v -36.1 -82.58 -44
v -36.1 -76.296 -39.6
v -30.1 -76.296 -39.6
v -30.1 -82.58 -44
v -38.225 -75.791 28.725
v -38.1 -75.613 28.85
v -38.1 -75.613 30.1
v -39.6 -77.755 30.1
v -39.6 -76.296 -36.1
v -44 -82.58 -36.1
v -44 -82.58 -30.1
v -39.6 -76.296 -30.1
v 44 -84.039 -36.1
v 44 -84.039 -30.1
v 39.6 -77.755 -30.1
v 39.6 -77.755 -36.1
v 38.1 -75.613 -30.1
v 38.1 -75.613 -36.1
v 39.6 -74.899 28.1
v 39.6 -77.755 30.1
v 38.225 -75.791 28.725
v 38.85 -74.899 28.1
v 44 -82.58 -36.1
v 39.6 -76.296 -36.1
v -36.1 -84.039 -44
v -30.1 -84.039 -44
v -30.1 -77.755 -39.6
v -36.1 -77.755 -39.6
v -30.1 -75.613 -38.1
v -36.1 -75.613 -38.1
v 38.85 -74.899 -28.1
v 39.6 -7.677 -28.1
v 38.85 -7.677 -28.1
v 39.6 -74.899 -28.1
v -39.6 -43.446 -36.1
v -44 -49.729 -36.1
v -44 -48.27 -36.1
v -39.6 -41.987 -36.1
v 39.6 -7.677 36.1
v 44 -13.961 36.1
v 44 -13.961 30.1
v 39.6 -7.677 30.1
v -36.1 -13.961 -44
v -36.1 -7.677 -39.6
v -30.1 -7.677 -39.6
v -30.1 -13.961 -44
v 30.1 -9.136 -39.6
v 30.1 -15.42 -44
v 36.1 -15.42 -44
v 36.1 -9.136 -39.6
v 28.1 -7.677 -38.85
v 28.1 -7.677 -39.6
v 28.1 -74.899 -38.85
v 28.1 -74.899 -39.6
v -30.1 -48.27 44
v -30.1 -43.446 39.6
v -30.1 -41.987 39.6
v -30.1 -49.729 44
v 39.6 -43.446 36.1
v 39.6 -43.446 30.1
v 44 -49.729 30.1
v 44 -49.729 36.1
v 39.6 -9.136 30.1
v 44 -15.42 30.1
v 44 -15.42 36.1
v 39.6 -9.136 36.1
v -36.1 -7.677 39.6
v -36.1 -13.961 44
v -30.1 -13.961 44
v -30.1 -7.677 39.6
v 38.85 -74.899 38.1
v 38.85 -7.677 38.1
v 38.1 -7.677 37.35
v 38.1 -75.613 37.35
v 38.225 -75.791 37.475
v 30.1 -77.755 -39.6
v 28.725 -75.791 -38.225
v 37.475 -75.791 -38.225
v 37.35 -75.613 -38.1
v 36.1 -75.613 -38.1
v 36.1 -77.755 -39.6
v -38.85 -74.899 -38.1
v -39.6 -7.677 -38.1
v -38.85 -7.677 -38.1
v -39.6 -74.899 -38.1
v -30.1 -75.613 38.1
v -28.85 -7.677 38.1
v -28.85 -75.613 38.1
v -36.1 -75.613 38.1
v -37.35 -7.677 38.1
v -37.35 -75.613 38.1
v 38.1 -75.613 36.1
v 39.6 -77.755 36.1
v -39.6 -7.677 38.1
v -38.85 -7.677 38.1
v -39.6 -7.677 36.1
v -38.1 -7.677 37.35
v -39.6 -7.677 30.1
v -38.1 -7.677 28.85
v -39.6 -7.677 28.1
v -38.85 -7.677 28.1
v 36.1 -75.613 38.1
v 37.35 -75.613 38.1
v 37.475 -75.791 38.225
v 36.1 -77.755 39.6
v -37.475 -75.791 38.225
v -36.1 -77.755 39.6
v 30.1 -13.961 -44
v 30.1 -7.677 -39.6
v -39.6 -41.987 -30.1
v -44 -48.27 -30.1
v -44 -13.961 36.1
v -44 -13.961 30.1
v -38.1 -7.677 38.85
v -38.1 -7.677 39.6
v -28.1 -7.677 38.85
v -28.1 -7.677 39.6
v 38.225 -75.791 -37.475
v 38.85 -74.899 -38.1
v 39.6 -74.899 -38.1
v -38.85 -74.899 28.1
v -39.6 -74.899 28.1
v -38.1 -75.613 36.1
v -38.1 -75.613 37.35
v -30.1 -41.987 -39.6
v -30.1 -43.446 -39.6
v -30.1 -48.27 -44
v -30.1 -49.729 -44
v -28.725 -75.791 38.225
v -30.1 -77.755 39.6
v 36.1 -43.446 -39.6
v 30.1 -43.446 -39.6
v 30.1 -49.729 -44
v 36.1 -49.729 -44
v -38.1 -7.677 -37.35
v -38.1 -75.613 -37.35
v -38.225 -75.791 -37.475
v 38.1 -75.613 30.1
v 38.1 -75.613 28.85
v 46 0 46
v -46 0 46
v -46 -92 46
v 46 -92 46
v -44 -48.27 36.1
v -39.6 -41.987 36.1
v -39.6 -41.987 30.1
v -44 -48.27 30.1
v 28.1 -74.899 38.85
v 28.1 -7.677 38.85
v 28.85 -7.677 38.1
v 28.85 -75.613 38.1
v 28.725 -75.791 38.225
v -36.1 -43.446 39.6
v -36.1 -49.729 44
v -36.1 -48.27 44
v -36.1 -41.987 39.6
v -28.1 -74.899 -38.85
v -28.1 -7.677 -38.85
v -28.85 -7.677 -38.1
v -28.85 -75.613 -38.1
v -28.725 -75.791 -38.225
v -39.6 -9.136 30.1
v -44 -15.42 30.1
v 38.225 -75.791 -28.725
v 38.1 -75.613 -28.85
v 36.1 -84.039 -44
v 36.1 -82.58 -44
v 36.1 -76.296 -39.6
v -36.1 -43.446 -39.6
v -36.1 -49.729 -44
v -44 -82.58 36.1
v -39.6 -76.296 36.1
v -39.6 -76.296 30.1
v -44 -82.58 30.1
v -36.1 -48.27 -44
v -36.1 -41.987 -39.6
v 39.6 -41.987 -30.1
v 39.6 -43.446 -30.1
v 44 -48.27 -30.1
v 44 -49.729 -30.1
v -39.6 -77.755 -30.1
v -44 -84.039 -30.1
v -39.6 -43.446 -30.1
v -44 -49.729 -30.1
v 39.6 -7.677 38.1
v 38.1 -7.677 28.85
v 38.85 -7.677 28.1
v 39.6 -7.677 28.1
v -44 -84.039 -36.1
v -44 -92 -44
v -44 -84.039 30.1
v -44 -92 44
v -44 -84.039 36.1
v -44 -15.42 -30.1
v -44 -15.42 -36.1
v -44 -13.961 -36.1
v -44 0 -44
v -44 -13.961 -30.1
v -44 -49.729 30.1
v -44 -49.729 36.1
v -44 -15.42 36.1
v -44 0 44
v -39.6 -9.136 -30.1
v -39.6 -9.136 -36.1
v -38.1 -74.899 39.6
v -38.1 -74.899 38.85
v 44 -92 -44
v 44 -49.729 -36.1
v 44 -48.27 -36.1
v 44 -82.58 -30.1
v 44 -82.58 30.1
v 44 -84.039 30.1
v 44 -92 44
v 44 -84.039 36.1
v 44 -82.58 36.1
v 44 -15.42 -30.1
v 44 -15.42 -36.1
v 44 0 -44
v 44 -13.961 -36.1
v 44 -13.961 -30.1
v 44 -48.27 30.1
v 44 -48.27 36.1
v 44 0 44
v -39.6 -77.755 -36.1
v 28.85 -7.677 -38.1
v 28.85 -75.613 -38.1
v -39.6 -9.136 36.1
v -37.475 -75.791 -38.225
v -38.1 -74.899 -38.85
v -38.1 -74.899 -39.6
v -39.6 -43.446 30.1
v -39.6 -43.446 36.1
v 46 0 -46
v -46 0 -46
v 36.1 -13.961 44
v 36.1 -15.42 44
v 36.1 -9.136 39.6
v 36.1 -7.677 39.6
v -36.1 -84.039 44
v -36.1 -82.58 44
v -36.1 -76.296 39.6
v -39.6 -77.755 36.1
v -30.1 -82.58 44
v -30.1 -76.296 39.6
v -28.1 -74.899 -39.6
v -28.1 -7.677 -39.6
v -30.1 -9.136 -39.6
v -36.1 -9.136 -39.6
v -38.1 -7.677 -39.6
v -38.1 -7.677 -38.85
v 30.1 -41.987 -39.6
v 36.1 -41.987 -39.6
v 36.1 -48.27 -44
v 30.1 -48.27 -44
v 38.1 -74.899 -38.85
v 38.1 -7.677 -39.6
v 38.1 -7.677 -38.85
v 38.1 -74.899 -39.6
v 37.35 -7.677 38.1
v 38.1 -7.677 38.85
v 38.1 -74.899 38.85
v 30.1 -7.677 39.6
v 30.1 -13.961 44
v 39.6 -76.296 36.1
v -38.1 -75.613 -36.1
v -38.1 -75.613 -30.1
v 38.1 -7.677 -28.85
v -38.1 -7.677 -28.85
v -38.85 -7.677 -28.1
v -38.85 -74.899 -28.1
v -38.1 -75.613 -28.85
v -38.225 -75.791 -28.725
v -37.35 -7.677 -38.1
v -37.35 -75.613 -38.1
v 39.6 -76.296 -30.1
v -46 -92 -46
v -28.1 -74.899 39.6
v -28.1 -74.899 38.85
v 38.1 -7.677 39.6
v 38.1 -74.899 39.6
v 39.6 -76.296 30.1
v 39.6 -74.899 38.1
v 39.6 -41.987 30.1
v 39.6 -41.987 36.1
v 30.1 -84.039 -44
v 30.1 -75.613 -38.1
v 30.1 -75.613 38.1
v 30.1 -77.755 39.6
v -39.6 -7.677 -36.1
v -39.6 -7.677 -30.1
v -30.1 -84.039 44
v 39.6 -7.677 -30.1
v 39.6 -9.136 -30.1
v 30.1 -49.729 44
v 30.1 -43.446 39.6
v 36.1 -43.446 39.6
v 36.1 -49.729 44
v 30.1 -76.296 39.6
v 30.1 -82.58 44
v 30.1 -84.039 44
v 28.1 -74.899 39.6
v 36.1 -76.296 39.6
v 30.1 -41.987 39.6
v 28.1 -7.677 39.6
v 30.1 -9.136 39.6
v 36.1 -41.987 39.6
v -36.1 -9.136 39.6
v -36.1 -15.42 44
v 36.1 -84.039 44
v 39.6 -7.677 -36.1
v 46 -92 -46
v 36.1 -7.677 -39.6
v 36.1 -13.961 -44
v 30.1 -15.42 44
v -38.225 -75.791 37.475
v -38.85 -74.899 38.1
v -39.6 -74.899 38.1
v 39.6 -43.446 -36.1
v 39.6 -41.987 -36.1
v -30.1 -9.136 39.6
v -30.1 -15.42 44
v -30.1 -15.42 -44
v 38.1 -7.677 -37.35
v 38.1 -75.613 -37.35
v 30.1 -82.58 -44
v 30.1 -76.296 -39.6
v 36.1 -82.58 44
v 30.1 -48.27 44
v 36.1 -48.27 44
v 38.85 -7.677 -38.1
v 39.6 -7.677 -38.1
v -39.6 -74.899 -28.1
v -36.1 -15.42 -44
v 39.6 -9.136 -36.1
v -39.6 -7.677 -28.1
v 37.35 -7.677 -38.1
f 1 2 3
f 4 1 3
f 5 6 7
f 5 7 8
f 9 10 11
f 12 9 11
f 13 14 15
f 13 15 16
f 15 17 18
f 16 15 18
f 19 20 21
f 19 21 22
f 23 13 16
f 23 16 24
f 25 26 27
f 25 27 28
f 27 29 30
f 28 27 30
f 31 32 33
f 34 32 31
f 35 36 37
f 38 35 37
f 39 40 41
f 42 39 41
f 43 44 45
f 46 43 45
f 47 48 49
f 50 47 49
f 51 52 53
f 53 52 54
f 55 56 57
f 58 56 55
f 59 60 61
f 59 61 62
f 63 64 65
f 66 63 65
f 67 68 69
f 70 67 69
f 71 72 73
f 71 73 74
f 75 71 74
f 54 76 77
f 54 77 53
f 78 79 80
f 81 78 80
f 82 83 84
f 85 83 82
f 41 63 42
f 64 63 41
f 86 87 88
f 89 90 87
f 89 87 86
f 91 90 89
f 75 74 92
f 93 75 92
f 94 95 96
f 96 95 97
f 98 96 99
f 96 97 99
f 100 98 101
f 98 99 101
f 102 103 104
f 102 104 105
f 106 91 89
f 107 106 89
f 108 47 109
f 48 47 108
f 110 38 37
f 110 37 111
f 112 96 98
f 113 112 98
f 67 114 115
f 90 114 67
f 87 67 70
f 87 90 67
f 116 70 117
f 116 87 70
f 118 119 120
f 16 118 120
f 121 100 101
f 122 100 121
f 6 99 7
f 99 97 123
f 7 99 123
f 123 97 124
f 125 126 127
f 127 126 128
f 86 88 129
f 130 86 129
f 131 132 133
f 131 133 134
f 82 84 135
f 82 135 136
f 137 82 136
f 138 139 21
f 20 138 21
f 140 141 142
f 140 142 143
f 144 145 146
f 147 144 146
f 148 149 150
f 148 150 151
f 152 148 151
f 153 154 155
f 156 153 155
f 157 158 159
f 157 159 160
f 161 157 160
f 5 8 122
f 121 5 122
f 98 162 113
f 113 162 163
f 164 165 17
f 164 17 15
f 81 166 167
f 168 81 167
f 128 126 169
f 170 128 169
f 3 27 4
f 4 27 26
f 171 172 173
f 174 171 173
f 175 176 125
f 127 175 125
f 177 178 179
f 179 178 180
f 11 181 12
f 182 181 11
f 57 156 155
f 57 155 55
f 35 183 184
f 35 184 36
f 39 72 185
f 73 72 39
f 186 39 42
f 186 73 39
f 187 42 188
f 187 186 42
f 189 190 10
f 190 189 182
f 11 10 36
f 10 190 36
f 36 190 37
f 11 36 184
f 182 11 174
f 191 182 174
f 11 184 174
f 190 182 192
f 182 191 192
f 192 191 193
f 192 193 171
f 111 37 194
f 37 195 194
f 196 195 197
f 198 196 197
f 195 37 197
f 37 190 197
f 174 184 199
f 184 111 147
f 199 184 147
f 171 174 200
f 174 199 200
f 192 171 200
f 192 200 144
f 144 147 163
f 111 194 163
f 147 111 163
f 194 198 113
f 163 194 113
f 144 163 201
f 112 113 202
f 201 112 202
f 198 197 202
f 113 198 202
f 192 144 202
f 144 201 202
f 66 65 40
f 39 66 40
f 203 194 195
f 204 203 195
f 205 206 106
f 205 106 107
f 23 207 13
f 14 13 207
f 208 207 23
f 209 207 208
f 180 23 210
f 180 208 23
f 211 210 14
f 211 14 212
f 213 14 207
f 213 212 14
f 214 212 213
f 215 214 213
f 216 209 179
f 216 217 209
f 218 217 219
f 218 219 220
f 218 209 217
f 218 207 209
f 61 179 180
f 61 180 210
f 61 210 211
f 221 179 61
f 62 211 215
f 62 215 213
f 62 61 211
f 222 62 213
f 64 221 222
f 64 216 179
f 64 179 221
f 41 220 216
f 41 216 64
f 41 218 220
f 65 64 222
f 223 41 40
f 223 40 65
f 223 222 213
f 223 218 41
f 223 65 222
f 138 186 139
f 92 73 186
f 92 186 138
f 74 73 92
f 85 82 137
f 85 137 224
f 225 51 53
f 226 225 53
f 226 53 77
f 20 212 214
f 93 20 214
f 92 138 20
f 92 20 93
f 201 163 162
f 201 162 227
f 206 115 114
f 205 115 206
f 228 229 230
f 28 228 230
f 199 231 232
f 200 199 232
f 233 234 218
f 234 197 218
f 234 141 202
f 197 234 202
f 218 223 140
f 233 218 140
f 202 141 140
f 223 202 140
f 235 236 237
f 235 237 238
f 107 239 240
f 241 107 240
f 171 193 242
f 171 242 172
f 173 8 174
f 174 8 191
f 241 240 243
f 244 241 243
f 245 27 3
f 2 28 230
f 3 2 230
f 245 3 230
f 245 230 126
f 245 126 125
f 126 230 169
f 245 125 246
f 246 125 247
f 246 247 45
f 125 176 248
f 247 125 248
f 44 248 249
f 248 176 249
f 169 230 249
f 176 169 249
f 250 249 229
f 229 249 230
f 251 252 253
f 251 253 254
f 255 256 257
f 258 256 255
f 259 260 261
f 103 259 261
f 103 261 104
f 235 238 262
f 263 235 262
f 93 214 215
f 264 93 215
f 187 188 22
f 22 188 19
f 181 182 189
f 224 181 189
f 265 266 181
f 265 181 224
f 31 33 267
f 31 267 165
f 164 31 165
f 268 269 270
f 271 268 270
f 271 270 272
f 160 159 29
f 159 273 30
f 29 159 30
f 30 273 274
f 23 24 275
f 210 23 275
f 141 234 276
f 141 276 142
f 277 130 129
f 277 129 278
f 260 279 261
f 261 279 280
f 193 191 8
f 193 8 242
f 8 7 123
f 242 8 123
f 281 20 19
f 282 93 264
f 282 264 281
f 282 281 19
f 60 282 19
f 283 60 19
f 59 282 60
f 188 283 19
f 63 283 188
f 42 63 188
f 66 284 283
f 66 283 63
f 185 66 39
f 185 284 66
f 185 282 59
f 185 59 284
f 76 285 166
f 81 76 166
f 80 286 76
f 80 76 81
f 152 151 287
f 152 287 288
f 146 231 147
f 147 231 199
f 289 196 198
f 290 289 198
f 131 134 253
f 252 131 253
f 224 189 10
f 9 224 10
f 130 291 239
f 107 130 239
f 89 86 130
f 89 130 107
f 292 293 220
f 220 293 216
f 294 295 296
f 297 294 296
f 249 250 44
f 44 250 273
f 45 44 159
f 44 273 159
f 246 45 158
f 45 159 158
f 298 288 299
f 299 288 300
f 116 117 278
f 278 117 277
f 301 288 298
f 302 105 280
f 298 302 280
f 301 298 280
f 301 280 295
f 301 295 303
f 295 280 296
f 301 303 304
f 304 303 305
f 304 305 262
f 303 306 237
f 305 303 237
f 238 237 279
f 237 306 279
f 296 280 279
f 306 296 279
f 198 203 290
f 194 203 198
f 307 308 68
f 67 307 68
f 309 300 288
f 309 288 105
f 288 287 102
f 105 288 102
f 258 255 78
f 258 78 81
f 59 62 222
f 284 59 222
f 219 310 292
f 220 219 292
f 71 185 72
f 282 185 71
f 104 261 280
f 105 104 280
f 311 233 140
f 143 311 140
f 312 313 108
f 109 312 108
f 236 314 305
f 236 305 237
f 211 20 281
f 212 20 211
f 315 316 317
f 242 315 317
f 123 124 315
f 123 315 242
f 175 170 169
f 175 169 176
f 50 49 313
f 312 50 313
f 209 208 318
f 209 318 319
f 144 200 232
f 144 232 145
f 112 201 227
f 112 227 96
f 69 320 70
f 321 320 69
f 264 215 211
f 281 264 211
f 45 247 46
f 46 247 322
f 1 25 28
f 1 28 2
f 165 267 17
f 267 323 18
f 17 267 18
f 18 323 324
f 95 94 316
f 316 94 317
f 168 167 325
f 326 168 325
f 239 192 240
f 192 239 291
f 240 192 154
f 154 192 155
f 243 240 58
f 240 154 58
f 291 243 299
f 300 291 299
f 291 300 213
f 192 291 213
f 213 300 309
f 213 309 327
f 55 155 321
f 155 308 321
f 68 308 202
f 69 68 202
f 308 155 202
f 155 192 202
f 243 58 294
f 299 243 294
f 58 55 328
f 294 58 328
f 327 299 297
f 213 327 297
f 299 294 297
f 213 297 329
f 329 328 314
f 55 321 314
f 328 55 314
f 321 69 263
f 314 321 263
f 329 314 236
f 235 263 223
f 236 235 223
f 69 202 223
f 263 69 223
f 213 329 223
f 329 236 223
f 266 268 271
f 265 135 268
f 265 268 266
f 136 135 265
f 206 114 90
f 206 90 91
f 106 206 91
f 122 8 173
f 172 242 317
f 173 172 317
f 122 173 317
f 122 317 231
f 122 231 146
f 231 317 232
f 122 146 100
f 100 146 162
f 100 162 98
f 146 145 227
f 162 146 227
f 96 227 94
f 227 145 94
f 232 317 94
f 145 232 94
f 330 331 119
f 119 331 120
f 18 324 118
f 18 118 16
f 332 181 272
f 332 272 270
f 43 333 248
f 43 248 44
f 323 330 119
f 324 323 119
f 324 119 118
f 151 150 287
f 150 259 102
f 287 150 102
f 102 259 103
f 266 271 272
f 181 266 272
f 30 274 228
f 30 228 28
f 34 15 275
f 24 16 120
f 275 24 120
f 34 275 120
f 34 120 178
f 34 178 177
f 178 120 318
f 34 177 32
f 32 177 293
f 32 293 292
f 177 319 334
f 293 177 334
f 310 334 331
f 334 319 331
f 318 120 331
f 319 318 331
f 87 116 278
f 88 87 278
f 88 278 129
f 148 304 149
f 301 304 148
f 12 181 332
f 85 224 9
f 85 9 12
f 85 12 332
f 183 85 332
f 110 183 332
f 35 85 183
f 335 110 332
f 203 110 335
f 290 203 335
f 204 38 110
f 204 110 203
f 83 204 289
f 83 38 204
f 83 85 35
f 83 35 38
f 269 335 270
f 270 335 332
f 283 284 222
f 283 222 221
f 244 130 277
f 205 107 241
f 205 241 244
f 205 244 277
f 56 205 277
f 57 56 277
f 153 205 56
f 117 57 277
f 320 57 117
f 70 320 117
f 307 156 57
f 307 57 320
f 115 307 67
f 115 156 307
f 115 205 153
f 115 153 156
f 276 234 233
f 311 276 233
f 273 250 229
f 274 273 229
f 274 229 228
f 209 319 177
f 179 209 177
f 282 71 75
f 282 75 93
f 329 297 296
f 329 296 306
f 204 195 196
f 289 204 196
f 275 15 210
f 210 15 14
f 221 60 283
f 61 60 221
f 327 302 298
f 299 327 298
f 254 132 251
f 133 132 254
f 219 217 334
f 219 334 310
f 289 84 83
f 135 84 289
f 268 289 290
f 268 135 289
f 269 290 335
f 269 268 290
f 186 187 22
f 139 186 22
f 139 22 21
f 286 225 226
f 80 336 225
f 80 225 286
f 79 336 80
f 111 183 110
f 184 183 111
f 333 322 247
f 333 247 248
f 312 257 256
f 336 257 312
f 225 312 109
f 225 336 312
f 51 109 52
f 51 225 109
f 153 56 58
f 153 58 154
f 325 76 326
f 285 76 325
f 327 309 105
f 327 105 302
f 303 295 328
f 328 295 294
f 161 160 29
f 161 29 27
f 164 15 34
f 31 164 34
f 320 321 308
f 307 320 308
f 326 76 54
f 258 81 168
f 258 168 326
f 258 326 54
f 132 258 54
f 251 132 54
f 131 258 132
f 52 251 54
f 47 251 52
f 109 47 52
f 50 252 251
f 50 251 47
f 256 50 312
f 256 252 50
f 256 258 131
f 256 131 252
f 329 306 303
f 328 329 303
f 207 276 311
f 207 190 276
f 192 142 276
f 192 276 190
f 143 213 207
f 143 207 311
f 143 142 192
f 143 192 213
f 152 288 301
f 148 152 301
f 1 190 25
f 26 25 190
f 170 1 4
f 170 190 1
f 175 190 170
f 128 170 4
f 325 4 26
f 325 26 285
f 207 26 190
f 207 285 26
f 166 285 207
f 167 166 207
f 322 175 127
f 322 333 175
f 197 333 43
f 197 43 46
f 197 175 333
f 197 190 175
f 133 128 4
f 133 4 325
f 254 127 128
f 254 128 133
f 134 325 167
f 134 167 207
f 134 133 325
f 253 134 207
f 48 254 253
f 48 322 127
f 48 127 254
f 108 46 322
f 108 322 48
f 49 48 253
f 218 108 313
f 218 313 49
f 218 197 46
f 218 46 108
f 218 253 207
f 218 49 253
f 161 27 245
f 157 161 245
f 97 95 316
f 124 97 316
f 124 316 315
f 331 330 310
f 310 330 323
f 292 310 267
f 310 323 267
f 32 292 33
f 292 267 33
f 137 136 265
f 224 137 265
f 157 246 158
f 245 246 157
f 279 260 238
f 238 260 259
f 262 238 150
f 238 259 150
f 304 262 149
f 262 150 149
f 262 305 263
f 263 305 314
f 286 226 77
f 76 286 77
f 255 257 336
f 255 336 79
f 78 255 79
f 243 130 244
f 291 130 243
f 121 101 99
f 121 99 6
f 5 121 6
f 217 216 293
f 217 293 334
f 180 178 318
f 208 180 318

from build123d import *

# Parameters (mm, degrees)
F0_W      = 92
F0_H      = 92
F0_W_2    = 88
F0_H_2    = 88
F1_DEPTH  = 92
F2_W      = 6
F2_H      = 1.459
F2_H_2    = 0.7295
F7_DEPTH  = 5
F8_W      = 10
F8_H      = 7.6772981499
F9_DEPTH  = 3
F10_SIZE  = 0.75
F12_COUNT = 4


with BuildPart() as f1:
    # F0 (on Front) → F1 (new body)
    with BuildSketch(Plane.XZ):
        Rectangle(F0_W, F0_H)
        Rectangle(F0_W_2, F0_H_2, mode=Mode.SUBTRACT)
    extrude(amount=F1_DEPTH)

    # F6: sweep along a path in F5
    with BuildLine(Plane(origin=(-33.1, 0, 0), x_dir=(0, -1, 0), z_dir=(-1, 0, 0))) as f6_path:
        Line((84.0388506204, 44), (75.6127773806, 38.1))
    # F2 (on face) → F6 (sweep)
    with BuildSketch(Plane(origin=(0, 0, 44), x_dir=(1, 0, 0), z_dir=(0, 0, -1))):
        with Locations((-33.1, 83.3093506204)):
            Rectangle(F2_W, F2_H)
        with Locations((-33.1, 48.63525)):
            Rectangle(F2_W, F2_H_2)
        with Locations((-33.1, 49.36475)):
            Rectangle(F2_W, F2_H_2)
        with Locations((-33.1, 14.6906493796)):
            Rectangle(F2_W, F2_H)
    sweep(path=f6_path.line)

    # F5 (on line) → F7 (join, symmetric)
    with BuildSketch(Plane(origin=(-33.1, 0, 0), x_dir=(0, -1, 0), z_dir=(-1, 0, 0))):
        Polygon((75.6127773806, 38.1), (77.7549993907, 39.6), (0, 39.6), (0, 38.1), align=None)
    extrude(amount=F7_DEPTH, both=True)

    # F8 (on face) → F9 (cut)
    with BuildSketch(Plane(origin=(0, 0, 38.1), x_dir=(1, 0, 0), z_dir=(0, 0, -1))):
        Polygon((-38.1, 74.8987033772), (-36.1, 77.7549993907), (-38.1, 77.7549993907), align=None)
        Polygon((-30.1, 77.7549993907), (-28.1, 74.8987033772), (-28.1, 77.7549993907), align=None)
        with Locations((-33.1, 3.838649075)):
            Rectangle(F8_W, F8_H)
    extrude(amount=-F9_DEPTH, mode=Mode.SUBTRACT)

    # F10
    f10_edges = [f1.edges().sort_by_distance(p)[0] for p in [
        (-38.1, -41.288001, 38.1),
        (-28.1, -41.288001, 38.1),
    ]]
    chamfer(f10_edges, length=F10_SIZE)

    # F11: F1 across plane


with BuildPart() as f1_1:
    add(f1.part)
    add(f1.part.mirror(Plane.YZ))

    # F12: F1 ×4 about axis
    f12_axis = Axis((0, -46, 0), (0, -1, 0))


with BuildPart() as f1_2:
    add(f1_1.part)
    for i in range(1, F12_COUNT):
        add(f1_1.part.rotate(f12_axis, i * 360 / F12_COUNT))


solid = f1_2.part
